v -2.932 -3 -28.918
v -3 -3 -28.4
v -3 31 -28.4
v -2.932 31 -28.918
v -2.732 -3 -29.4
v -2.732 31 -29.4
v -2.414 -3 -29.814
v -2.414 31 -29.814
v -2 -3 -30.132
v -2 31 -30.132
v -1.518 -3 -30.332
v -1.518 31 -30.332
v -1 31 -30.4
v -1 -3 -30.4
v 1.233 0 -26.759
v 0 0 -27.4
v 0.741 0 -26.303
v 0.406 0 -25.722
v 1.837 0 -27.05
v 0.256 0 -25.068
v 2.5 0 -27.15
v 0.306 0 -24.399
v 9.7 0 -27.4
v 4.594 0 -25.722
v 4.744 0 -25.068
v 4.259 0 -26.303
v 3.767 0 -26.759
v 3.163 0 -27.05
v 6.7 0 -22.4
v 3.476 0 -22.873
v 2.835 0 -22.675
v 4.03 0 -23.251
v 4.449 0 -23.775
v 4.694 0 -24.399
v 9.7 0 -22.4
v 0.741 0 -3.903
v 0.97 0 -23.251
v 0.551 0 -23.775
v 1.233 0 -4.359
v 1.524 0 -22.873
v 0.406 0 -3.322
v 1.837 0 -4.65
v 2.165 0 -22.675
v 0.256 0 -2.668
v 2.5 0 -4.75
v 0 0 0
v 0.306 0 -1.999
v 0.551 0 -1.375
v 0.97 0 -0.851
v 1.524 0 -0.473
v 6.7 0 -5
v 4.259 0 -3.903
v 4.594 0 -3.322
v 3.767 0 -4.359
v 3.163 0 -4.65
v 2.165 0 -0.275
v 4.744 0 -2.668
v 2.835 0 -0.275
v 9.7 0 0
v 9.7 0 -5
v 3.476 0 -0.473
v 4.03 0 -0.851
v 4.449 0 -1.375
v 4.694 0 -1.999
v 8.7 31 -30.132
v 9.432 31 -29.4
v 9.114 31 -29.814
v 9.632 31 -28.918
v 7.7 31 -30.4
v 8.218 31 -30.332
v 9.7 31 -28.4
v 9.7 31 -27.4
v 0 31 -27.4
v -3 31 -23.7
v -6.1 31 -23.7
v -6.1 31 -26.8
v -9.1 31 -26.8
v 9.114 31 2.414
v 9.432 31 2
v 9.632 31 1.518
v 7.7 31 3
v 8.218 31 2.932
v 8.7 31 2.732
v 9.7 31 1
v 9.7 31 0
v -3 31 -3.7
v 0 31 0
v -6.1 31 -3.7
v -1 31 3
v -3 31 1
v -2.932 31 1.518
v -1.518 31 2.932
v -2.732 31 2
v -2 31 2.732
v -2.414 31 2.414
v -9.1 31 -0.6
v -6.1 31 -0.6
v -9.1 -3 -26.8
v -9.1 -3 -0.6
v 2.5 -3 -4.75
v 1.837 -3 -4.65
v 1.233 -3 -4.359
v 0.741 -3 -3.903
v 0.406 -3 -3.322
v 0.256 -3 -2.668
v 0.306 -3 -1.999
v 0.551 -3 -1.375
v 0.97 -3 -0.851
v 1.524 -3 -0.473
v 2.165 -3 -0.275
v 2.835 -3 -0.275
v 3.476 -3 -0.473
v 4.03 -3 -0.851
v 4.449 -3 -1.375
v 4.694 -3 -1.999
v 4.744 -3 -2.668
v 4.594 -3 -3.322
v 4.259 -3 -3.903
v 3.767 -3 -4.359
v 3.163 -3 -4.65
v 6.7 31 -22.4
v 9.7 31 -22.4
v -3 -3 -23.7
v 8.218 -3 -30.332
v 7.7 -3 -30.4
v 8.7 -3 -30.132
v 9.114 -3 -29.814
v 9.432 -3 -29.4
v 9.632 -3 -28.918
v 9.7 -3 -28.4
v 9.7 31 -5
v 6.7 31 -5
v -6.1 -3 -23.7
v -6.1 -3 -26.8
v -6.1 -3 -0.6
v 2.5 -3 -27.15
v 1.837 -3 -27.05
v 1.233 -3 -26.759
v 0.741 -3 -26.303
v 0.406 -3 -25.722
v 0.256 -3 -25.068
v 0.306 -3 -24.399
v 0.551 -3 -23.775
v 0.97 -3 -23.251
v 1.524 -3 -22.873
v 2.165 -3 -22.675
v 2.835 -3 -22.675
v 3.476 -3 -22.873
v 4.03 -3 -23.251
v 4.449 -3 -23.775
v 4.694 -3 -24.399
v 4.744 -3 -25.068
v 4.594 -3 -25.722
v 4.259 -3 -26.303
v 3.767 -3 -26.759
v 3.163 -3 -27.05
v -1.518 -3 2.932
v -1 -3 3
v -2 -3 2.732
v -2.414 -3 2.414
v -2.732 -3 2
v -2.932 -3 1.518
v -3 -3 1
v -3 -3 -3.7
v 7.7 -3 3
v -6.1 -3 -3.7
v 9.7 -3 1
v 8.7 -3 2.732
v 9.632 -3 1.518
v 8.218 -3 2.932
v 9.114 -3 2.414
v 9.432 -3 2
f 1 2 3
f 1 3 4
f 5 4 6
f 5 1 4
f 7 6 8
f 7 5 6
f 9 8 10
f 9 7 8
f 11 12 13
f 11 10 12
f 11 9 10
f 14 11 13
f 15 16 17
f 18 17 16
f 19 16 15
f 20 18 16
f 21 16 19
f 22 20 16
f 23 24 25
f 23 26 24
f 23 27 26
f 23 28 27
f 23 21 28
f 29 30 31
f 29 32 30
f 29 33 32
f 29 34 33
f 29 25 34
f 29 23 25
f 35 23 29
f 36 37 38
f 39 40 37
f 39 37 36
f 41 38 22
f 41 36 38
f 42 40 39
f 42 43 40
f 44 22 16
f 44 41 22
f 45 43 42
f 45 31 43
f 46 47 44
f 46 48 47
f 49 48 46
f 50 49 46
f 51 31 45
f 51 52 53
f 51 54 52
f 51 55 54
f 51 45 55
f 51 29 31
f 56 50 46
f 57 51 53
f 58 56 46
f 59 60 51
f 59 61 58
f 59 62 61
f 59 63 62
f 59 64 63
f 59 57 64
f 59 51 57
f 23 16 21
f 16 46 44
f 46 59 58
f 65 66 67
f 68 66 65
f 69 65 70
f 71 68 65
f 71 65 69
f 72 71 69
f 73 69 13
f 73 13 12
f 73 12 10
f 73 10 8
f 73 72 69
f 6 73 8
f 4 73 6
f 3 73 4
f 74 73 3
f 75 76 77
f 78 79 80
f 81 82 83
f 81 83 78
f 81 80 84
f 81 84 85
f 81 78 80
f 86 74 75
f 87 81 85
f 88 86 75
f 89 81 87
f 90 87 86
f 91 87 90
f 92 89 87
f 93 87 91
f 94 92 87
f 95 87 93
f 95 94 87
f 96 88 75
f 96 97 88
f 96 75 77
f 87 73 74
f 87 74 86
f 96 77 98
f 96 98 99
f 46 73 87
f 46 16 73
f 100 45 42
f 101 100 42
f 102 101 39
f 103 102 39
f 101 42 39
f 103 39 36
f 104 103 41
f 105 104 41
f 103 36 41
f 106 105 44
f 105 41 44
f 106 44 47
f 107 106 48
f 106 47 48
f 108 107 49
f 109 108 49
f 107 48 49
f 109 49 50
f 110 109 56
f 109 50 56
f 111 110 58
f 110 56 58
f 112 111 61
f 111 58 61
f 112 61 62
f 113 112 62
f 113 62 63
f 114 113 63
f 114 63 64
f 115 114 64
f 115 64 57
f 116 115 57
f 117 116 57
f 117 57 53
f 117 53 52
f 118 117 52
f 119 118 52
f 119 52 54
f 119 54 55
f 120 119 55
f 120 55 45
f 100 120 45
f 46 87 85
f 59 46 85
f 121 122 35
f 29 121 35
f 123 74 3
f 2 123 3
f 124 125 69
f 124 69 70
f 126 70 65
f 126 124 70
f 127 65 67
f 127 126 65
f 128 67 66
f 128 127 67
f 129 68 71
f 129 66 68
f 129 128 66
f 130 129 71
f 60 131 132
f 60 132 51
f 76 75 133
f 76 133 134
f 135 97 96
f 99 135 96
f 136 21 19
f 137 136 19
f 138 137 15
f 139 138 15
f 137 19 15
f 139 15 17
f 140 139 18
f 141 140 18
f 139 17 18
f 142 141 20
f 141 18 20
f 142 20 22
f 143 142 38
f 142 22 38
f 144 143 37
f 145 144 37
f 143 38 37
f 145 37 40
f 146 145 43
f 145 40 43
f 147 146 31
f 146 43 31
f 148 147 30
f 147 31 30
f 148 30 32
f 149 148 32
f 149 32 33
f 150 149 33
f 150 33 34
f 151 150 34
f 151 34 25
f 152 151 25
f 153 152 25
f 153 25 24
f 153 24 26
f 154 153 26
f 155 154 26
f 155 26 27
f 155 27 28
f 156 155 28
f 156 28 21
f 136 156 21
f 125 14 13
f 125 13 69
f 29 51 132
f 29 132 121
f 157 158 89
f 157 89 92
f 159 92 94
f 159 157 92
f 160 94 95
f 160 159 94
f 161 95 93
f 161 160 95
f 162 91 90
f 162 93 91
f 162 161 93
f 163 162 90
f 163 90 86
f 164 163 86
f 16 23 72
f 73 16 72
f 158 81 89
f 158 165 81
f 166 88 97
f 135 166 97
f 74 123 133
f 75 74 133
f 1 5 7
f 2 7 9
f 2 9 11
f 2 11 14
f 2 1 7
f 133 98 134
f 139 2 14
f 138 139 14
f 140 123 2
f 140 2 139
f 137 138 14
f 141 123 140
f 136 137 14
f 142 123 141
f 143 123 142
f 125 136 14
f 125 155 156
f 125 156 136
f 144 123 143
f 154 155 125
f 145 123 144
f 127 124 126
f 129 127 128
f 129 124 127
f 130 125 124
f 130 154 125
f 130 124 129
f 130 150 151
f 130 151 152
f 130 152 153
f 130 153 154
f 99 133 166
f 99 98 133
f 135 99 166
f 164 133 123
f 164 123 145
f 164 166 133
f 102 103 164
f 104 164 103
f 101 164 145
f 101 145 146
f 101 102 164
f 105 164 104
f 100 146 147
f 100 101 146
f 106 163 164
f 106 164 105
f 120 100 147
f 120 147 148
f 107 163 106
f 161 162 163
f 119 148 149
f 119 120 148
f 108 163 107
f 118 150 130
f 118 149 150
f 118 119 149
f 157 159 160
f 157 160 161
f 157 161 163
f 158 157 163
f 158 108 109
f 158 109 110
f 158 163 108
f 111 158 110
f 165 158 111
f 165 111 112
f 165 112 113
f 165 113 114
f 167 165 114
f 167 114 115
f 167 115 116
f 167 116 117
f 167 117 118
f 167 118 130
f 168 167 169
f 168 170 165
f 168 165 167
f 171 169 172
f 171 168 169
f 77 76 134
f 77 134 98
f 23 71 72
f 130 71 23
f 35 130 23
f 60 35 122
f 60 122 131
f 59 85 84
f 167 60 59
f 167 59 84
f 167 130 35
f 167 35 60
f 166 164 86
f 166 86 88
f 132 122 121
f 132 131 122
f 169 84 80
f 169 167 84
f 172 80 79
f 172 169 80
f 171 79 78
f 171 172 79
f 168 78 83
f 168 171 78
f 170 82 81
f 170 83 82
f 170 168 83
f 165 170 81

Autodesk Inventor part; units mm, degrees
ref_plane "YZ Plane" through (0, 0, 0) normal (1, 0, 0) x (0, 1, 0)
ref_plane "XZ Plane" through (0, 0, 0) normal (0, 1, 0) x (-1, 0, 0)
ref_plane "XY Plane" through (0, 0, 0) normal (0, 0, 1) x (1, 0, 0)
sketch "Boceto1" plane through (0, 0, 0) normal (0, 1, 0) x (-1, 0, 0)
  line L0 (0, 0) -> (-6.7, 0)
  line L1 (-6.7, 0) -> (-6.7, -27.4)
  line L2 (-6.7, -27.4) -> (0, -27.4)
  line L3 (0, -27.4) -> (0, 0)
  line L4 (-7.7, 3) -> (1, 3)
  line L5 (3, 1) -> (3, -28.4)
  line L6 (1, -30.4) -> (-7.7, -30.4)
  line L7 (-9.7, -28.4) -> (-9.7, 1)
  arc A0 (3, 1) -> (1, 3) centre (1, 1) ccw
  arc A1 (-7.7, 3) -> (-9.7, 1) centre (-7.7, 1) ccw
  arc A2 (-9.7, -28.4) -> (-7.7, -30.4) centre (-7.7, -28.4) ccw
  arc A3 (1, -30.4) -> (3, -28.4) centre (1, -28.4) ccw
  dimension "d0" = 6.7
  dimension "d1" = 27.4
  dimension "d2" = 3
  dimension "d3" = 2
extrude "Extrusión1" add sketch "Boceto1" along normal blind 31
sketch "Boceto2" plane through (0, 0, 0) normal (0, -1, 0) x (1, 0, 0)
  line L0 (9.7, 1) -> (9.7, -28.4) projected
  arc A0 (9.7, 1) -> (7.7, 3) centre (7.7, 1) ccw projected
  line L1 (-1, 3) -> (7.7, 3) projected
  arc A1 (-1, 3) -> (-3, 1) centre (-1, 1) ccw projected
  line L2 (-3, -28.4) -> (-3, 1) projected
  arc A2 (-3, -28.4) -> (-1, -30.4) centre (-1, -28.4) ccw projected
  line L3 (7.7, -30.4) -> (-1, -30.4) projected
  arc A3 (7.7, -30.4) -> (9.7, -28.4) centre (7.7, -28.4) ccw projected
  point P0 (0, 0)
extrude "Extrusión2" add sketch "Boceto2" along normal blind 3
sketch "Boceto3" plane through (9.7, 31, 1) normal (1, 0, 0) x (0, 0, -1)
  line L0 (29.4, -34) -> (29.4, 0) projected
  line L1 (0, 0) -> (29.4, 0) projected
  line L2 (0, -34) -> (0, 0) projected
  line L3 (29.4, -34) -> (0, -34) projected
  line L4 (28.4, -31) -> (28.4, 0) projected
  line L5 (1, -31) -> (1, 0) projected
  line L6 (28.4, -31) -> (1, -31) projected
  line L7 (6, 0) -> (6, -26)
  line L8 (6, -26) -> (23.4, -26)
  line L9 (23.4, -26) -> (23.4, 0)
  line L10 (23.4, -26) -> (23.4, -31)
  line L11 (6, -26) -> (6, -31)
  point P0 (6, 0)
  dimension "d8" = 5
extrude "Extrusión3" cut sketch "Boceto3" against normal blind 3 contours L4 L6 L10 L9 L1 | L1 L7 L11 L6 L5
sketch "Boceto4" plane through (0, -3, 0) normal (0, -1, 0) x (1, 0, 0)
  line L0 (-3, 1) -> (-3, -28.4) projected
  line L1 (-3, -3.7) -> (-6.1, -3.7)
  line L2 (-6.1, -3.7) -> (-6.1, -0.6)
  line L3 (-6.1, -0.6) -> (-9.1, -0.6)
  line L4 (-3, -23.7) -> (-6.1, -23.7)
  line L5 (-6.1, -23.7) -> (-6.1, -26.8)
  line L6 (-6.1, -26.8) -> (-9.1, -26.8)
  line L7 (-9.1, -26.8) -> (-9.1, -0.6)
  line L8 (0, 0) -> (0, -27.4) projected
  point P0 (0, -13.7)
  dimension "d11" = 3.1
  dimension "d12" = 3.1
  dimension "d13" = 3
  dimension "d14" = 3.1
  dimension "d15" = 10
  dimension "d16" = 10
  dimension "d17" = 3.1
extrude "Extrusión4" add sketch "Boceto4" against normal up to surface (34 mm away)
sketch "Boceto5" plane through (0, -3, 0) normal (0, -1, 0) x (1, 0, 0)
  line L0 (9.7, 0) -> (0, 0) projected
  line L1 (9.7, -5) -> (9.7, 0) projected
  line L2 (9.7, -5) -> (6.7, -5) projected
  line L3 (6.7, -22.4) -> (6.7, -5) projected
  line L4 (9.7, -22.4) -> (6.7, -22.4) projected
  line L5 (9.7, -27.4) -> (9.7, -22.4) projected
  line L6 (0, -27.4) -> (9.7, -27.4) projected
  line L7 (0, 0) -> (0, -27.4) projected
  point P0 (2.5, -2.5)
  point P1 (2.5, -24.9)
  dimension "d20" = 2.5
  dimension "d21" = 2.5
hole "Agujero1" at (2.5, -3, -2.5) at (2.5, -3, -24.9) direction (0, 1, 0) diameter 4.5 end through all
properties part number "cajaEsp32Cam"
